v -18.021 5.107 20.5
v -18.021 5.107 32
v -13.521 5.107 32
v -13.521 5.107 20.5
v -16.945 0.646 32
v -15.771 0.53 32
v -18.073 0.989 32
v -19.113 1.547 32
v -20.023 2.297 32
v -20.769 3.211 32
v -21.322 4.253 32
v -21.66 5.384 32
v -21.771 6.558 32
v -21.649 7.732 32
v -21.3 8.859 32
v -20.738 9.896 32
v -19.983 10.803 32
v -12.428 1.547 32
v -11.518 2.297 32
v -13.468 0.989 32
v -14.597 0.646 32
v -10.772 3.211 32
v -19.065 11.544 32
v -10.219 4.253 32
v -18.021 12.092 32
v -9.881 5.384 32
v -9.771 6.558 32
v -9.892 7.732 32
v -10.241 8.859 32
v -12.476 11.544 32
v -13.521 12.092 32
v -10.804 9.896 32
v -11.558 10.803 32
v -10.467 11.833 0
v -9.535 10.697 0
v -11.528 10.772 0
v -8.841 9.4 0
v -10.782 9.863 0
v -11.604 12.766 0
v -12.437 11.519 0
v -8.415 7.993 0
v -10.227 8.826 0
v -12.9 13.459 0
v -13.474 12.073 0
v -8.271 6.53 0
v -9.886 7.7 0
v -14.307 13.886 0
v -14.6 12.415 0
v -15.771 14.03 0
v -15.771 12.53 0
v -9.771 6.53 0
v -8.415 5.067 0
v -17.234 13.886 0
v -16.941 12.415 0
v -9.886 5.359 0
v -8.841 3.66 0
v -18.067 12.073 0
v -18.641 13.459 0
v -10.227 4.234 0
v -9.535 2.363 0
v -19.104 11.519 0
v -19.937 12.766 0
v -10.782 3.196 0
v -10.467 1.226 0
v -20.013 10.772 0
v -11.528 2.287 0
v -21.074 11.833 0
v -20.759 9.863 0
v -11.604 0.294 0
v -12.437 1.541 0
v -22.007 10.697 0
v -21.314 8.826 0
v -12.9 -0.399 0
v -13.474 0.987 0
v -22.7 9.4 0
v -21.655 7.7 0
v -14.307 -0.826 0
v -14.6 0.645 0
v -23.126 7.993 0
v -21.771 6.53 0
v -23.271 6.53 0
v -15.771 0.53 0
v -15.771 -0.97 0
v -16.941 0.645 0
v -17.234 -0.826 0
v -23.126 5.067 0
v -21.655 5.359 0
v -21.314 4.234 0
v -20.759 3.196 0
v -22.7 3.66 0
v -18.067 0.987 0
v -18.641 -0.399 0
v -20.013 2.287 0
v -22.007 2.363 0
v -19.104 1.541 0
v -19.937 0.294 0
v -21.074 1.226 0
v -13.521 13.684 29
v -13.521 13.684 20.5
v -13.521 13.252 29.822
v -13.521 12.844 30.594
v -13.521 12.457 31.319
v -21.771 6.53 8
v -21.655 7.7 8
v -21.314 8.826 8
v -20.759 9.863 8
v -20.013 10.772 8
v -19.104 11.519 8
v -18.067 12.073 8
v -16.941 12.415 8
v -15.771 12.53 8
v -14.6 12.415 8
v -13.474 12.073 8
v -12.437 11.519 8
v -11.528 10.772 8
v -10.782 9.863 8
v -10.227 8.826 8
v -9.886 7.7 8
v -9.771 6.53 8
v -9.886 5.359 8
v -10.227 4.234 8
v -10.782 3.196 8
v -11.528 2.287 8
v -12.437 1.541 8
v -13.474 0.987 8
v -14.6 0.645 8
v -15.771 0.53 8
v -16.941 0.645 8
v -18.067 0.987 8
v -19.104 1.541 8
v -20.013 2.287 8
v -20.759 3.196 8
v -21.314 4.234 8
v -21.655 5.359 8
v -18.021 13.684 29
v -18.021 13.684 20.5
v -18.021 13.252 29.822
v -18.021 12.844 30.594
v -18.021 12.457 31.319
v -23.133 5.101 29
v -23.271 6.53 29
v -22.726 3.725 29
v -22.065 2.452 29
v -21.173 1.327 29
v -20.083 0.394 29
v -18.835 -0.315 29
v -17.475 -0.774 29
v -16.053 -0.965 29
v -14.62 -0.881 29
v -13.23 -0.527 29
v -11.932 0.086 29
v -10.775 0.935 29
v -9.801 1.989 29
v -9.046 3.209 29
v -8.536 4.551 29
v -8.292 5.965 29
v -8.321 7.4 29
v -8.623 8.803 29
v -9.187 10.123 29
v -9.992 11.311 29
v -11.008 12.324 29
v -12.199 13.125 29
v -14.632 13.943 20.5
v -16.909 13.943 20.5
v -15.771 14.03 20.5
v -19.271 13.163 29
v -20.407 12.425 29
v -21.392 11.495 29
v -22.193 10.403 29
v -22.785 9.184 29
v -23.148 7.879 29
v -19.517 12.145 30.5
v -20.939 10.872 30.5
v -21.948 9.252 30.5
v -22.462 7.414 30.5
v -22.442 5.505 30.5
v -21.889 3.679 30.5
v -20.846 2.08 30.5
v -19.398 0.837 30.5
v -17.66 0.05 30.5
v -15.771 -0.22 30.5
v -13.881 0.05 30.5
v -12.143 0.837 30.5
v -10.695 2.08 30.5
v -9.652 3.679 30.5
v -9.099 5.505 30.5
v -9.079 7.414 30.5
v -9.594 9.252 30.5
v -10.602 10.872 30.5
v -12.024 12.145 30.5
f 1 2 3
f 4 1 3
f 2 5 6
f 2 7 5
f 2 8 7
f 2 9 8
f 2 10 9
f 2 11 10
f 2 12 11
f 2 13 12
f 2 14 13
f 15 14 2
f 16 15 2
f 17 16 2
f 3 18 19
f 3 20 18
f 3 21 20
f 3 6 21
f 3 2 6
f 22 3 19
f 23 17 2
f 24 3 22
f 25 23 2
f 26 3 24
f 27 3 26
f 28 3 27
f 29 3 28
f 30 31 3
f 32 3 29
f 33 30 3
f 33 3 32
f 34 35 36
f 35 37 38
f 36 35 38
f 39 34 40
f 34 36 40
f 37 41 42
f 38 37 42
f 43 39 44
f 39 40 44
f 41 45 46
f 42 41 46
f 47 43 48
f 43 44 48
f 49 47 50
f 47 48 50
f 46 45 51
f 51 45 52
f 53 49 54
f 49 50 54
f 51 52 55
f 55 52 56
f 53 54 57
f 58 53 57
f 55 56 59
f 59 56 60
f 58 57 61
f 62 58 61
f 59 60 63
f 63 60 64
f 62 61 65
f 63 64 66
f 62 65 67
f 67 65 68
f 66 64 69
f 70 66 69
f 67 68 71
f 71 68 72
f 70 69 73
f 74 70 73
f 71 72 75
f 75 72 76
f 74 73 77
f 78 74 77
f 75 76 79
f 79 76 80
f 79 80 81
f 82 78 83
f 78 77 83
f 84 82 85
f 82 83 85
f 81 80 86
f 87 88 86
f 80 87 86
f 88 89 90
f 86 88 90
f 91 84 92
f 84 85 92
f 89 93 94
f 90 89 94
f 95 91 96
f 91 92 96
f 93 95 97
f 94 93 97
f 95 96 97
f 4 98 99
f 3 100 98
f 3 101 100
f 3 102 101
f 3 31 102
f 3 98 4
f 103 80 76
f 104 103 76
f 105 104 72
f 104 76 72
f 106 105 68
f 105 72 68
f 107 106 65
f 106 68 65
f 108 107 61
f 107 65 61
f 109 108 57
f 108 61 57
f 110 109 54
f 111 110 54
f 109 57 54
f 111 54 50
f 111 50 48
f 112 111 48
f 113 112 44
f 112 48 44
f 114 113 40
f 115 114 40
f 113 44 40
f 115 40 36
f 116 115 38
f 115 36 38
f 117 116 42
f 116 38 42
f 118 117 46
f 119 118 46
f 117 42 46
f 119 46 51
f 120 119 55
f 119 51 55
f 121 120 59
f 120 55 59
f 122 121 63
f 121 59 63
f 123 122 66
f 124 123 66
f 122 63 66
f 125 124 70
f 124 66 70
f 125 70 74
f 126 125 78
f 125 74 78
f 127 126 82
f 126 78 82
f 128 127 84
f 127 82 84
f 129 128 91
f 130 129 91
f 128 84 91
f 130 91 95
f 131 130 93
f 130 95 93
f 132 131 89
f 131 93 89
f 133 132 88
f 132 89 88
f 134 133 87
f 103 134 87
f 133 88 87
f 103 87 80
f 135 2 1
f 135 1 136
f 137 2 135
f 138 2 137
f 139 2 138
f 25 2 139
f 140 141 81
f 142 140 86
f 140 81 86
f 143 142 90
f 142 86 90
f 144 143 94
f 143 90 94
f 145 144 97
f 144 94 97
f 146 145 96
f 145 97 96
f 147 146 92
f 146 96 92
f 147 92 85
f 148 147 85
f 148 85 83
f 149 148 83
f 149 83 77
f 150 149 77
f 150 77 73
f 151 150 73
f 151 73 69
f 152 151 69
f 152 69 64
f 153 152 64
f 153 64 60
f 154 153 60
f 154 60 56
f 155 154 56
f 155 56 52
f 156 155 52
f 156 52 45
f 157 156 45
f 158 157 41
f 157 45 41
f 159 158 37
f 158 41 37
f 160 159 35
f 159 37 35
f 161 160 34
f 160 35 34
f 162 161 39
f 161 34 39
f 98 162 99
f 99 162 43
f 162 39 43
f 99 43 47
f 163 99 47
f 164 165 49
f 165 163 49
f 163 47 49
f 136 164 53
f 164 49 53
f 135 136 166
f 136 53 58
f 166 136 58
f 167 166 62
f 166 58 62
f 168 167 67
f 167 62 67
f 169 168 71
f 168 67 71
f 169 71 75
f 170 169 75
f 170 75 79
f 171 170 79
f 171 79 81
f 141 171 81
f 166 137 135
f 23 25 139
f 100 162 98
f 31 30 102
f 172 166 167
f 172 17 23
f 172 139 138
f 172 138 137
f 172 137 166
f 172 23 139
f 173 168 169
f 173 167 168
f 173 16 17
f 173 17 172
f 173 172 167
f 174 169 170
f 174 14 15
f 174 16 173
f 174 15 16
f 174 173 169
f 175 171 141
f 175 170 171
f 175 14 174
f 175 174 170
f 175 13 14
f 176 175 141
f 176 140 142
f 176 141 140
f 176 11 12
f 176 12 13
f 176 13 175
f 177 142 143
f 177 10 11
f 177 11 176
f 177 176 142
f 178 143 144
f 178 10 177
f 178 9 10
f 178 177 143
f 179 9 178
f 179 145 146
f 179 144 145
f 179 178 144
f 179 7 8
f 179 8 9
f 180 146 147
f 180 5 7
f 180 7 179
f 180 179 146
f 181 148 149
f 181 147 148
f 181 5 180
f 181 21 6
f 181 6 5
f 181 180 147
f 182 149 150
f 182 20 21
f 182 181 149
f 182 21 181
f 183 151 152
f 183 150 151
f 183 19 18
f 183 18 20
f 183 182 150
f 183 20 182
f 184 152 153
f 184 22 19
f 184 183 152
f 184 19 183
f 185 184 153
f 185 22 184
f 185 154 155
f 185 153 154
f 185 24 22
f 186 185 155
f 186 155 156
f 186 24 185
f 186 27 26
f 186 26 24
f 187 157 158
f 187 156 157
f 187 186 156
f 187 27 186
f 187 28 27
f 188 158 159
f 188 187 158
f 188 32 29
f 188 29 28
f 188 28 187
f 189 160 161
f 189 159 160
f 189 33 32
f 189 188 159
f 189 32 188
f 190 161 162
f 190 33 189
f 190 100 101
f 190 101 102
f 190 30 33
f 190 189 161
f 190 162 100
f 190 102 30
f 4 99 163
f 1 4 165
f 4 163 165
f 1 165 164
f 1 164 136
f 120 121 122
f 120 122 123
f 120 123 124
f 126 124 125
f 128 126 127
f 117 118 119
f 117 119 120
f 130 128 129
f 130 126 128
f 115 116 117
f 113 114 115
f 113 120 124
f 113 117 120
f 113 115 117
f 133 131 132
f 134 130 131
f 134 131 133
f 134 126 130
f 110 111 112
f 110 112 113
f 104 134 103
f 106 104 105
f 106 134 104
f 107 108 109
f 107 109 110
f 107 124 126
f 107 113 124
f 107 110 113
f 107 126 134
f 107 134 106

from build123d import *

# Parameters (mm, degrees)
ESQUISSE1_R             = 7.5
BOSS_EXTRU_2_DEPTH      = 29
ESQUISSE10_R            = 6
ESQUISSE11_R            = 6
ENL_V_MAT_EXTRU_1_DEPTH = 8
ENL_V_MAT_EXTRU_2_DEPTH = 11.5


with BuildPart() as part:
    # Esquisse1 → Boss.-Extru.2 (new body)
    with BuildSketch(Plane.XY):
        with Locations(Location((-15.770569557, 6.529797245, 0), (0, 0, 180))):
            Circle(ESQUISSE1_R)
    extrude(amount=BOSS_EXTRU_2_DEPTH)

    # Esquisse10 → section 1 of lissage3
    with BuildSketch(Plane.XY.offset(32), mode=Mode.PRIVATE) as lissage3_s1:
        with Locations((-15.770569557, 6.529797245)):
            Circle(ESQUISSE10_R)
    # loft up to a face of the part (lissage3)
    loft([Face(Wire([part.edges().sort_by_distance((-10.636466262, 1.062532539, 29))[0]])), lissage3_s1.sketch])

    # Esquisse11 → Enlèv. mat.-Extru.1 (cut)
    with BuildSketch(Plane(origin=(0, 0, 0), x_dir=(-1, 0, 0), z_dir=(0, 0, -1))):
        with Locations((15.770569557, 6.529797245)):
            Circle(ESQUISSE11_R)
    extrude(amount=-ENL_V_MAT_EXTRU_1_DEPTH, mode=Mode.SUBTRACT)

    # Esquisse13 → Enlèv. mat.-Extru.2 (cut)
    with BuildSketch(Plane.XY.offset(32)):
        Polygon((-15.770569557, 5.107185968), (-18.020569557, 5.107185968), (-18.020569557, 15.896170682), (-13.520569557, 15.896170682), (-13.520569557, 5.107185968), align=None)
    extrude(amount=-ENL_V_MAT_EXTRU_2_DEPTH, mode=Mode.SUBTRACT)


solid = part.part
